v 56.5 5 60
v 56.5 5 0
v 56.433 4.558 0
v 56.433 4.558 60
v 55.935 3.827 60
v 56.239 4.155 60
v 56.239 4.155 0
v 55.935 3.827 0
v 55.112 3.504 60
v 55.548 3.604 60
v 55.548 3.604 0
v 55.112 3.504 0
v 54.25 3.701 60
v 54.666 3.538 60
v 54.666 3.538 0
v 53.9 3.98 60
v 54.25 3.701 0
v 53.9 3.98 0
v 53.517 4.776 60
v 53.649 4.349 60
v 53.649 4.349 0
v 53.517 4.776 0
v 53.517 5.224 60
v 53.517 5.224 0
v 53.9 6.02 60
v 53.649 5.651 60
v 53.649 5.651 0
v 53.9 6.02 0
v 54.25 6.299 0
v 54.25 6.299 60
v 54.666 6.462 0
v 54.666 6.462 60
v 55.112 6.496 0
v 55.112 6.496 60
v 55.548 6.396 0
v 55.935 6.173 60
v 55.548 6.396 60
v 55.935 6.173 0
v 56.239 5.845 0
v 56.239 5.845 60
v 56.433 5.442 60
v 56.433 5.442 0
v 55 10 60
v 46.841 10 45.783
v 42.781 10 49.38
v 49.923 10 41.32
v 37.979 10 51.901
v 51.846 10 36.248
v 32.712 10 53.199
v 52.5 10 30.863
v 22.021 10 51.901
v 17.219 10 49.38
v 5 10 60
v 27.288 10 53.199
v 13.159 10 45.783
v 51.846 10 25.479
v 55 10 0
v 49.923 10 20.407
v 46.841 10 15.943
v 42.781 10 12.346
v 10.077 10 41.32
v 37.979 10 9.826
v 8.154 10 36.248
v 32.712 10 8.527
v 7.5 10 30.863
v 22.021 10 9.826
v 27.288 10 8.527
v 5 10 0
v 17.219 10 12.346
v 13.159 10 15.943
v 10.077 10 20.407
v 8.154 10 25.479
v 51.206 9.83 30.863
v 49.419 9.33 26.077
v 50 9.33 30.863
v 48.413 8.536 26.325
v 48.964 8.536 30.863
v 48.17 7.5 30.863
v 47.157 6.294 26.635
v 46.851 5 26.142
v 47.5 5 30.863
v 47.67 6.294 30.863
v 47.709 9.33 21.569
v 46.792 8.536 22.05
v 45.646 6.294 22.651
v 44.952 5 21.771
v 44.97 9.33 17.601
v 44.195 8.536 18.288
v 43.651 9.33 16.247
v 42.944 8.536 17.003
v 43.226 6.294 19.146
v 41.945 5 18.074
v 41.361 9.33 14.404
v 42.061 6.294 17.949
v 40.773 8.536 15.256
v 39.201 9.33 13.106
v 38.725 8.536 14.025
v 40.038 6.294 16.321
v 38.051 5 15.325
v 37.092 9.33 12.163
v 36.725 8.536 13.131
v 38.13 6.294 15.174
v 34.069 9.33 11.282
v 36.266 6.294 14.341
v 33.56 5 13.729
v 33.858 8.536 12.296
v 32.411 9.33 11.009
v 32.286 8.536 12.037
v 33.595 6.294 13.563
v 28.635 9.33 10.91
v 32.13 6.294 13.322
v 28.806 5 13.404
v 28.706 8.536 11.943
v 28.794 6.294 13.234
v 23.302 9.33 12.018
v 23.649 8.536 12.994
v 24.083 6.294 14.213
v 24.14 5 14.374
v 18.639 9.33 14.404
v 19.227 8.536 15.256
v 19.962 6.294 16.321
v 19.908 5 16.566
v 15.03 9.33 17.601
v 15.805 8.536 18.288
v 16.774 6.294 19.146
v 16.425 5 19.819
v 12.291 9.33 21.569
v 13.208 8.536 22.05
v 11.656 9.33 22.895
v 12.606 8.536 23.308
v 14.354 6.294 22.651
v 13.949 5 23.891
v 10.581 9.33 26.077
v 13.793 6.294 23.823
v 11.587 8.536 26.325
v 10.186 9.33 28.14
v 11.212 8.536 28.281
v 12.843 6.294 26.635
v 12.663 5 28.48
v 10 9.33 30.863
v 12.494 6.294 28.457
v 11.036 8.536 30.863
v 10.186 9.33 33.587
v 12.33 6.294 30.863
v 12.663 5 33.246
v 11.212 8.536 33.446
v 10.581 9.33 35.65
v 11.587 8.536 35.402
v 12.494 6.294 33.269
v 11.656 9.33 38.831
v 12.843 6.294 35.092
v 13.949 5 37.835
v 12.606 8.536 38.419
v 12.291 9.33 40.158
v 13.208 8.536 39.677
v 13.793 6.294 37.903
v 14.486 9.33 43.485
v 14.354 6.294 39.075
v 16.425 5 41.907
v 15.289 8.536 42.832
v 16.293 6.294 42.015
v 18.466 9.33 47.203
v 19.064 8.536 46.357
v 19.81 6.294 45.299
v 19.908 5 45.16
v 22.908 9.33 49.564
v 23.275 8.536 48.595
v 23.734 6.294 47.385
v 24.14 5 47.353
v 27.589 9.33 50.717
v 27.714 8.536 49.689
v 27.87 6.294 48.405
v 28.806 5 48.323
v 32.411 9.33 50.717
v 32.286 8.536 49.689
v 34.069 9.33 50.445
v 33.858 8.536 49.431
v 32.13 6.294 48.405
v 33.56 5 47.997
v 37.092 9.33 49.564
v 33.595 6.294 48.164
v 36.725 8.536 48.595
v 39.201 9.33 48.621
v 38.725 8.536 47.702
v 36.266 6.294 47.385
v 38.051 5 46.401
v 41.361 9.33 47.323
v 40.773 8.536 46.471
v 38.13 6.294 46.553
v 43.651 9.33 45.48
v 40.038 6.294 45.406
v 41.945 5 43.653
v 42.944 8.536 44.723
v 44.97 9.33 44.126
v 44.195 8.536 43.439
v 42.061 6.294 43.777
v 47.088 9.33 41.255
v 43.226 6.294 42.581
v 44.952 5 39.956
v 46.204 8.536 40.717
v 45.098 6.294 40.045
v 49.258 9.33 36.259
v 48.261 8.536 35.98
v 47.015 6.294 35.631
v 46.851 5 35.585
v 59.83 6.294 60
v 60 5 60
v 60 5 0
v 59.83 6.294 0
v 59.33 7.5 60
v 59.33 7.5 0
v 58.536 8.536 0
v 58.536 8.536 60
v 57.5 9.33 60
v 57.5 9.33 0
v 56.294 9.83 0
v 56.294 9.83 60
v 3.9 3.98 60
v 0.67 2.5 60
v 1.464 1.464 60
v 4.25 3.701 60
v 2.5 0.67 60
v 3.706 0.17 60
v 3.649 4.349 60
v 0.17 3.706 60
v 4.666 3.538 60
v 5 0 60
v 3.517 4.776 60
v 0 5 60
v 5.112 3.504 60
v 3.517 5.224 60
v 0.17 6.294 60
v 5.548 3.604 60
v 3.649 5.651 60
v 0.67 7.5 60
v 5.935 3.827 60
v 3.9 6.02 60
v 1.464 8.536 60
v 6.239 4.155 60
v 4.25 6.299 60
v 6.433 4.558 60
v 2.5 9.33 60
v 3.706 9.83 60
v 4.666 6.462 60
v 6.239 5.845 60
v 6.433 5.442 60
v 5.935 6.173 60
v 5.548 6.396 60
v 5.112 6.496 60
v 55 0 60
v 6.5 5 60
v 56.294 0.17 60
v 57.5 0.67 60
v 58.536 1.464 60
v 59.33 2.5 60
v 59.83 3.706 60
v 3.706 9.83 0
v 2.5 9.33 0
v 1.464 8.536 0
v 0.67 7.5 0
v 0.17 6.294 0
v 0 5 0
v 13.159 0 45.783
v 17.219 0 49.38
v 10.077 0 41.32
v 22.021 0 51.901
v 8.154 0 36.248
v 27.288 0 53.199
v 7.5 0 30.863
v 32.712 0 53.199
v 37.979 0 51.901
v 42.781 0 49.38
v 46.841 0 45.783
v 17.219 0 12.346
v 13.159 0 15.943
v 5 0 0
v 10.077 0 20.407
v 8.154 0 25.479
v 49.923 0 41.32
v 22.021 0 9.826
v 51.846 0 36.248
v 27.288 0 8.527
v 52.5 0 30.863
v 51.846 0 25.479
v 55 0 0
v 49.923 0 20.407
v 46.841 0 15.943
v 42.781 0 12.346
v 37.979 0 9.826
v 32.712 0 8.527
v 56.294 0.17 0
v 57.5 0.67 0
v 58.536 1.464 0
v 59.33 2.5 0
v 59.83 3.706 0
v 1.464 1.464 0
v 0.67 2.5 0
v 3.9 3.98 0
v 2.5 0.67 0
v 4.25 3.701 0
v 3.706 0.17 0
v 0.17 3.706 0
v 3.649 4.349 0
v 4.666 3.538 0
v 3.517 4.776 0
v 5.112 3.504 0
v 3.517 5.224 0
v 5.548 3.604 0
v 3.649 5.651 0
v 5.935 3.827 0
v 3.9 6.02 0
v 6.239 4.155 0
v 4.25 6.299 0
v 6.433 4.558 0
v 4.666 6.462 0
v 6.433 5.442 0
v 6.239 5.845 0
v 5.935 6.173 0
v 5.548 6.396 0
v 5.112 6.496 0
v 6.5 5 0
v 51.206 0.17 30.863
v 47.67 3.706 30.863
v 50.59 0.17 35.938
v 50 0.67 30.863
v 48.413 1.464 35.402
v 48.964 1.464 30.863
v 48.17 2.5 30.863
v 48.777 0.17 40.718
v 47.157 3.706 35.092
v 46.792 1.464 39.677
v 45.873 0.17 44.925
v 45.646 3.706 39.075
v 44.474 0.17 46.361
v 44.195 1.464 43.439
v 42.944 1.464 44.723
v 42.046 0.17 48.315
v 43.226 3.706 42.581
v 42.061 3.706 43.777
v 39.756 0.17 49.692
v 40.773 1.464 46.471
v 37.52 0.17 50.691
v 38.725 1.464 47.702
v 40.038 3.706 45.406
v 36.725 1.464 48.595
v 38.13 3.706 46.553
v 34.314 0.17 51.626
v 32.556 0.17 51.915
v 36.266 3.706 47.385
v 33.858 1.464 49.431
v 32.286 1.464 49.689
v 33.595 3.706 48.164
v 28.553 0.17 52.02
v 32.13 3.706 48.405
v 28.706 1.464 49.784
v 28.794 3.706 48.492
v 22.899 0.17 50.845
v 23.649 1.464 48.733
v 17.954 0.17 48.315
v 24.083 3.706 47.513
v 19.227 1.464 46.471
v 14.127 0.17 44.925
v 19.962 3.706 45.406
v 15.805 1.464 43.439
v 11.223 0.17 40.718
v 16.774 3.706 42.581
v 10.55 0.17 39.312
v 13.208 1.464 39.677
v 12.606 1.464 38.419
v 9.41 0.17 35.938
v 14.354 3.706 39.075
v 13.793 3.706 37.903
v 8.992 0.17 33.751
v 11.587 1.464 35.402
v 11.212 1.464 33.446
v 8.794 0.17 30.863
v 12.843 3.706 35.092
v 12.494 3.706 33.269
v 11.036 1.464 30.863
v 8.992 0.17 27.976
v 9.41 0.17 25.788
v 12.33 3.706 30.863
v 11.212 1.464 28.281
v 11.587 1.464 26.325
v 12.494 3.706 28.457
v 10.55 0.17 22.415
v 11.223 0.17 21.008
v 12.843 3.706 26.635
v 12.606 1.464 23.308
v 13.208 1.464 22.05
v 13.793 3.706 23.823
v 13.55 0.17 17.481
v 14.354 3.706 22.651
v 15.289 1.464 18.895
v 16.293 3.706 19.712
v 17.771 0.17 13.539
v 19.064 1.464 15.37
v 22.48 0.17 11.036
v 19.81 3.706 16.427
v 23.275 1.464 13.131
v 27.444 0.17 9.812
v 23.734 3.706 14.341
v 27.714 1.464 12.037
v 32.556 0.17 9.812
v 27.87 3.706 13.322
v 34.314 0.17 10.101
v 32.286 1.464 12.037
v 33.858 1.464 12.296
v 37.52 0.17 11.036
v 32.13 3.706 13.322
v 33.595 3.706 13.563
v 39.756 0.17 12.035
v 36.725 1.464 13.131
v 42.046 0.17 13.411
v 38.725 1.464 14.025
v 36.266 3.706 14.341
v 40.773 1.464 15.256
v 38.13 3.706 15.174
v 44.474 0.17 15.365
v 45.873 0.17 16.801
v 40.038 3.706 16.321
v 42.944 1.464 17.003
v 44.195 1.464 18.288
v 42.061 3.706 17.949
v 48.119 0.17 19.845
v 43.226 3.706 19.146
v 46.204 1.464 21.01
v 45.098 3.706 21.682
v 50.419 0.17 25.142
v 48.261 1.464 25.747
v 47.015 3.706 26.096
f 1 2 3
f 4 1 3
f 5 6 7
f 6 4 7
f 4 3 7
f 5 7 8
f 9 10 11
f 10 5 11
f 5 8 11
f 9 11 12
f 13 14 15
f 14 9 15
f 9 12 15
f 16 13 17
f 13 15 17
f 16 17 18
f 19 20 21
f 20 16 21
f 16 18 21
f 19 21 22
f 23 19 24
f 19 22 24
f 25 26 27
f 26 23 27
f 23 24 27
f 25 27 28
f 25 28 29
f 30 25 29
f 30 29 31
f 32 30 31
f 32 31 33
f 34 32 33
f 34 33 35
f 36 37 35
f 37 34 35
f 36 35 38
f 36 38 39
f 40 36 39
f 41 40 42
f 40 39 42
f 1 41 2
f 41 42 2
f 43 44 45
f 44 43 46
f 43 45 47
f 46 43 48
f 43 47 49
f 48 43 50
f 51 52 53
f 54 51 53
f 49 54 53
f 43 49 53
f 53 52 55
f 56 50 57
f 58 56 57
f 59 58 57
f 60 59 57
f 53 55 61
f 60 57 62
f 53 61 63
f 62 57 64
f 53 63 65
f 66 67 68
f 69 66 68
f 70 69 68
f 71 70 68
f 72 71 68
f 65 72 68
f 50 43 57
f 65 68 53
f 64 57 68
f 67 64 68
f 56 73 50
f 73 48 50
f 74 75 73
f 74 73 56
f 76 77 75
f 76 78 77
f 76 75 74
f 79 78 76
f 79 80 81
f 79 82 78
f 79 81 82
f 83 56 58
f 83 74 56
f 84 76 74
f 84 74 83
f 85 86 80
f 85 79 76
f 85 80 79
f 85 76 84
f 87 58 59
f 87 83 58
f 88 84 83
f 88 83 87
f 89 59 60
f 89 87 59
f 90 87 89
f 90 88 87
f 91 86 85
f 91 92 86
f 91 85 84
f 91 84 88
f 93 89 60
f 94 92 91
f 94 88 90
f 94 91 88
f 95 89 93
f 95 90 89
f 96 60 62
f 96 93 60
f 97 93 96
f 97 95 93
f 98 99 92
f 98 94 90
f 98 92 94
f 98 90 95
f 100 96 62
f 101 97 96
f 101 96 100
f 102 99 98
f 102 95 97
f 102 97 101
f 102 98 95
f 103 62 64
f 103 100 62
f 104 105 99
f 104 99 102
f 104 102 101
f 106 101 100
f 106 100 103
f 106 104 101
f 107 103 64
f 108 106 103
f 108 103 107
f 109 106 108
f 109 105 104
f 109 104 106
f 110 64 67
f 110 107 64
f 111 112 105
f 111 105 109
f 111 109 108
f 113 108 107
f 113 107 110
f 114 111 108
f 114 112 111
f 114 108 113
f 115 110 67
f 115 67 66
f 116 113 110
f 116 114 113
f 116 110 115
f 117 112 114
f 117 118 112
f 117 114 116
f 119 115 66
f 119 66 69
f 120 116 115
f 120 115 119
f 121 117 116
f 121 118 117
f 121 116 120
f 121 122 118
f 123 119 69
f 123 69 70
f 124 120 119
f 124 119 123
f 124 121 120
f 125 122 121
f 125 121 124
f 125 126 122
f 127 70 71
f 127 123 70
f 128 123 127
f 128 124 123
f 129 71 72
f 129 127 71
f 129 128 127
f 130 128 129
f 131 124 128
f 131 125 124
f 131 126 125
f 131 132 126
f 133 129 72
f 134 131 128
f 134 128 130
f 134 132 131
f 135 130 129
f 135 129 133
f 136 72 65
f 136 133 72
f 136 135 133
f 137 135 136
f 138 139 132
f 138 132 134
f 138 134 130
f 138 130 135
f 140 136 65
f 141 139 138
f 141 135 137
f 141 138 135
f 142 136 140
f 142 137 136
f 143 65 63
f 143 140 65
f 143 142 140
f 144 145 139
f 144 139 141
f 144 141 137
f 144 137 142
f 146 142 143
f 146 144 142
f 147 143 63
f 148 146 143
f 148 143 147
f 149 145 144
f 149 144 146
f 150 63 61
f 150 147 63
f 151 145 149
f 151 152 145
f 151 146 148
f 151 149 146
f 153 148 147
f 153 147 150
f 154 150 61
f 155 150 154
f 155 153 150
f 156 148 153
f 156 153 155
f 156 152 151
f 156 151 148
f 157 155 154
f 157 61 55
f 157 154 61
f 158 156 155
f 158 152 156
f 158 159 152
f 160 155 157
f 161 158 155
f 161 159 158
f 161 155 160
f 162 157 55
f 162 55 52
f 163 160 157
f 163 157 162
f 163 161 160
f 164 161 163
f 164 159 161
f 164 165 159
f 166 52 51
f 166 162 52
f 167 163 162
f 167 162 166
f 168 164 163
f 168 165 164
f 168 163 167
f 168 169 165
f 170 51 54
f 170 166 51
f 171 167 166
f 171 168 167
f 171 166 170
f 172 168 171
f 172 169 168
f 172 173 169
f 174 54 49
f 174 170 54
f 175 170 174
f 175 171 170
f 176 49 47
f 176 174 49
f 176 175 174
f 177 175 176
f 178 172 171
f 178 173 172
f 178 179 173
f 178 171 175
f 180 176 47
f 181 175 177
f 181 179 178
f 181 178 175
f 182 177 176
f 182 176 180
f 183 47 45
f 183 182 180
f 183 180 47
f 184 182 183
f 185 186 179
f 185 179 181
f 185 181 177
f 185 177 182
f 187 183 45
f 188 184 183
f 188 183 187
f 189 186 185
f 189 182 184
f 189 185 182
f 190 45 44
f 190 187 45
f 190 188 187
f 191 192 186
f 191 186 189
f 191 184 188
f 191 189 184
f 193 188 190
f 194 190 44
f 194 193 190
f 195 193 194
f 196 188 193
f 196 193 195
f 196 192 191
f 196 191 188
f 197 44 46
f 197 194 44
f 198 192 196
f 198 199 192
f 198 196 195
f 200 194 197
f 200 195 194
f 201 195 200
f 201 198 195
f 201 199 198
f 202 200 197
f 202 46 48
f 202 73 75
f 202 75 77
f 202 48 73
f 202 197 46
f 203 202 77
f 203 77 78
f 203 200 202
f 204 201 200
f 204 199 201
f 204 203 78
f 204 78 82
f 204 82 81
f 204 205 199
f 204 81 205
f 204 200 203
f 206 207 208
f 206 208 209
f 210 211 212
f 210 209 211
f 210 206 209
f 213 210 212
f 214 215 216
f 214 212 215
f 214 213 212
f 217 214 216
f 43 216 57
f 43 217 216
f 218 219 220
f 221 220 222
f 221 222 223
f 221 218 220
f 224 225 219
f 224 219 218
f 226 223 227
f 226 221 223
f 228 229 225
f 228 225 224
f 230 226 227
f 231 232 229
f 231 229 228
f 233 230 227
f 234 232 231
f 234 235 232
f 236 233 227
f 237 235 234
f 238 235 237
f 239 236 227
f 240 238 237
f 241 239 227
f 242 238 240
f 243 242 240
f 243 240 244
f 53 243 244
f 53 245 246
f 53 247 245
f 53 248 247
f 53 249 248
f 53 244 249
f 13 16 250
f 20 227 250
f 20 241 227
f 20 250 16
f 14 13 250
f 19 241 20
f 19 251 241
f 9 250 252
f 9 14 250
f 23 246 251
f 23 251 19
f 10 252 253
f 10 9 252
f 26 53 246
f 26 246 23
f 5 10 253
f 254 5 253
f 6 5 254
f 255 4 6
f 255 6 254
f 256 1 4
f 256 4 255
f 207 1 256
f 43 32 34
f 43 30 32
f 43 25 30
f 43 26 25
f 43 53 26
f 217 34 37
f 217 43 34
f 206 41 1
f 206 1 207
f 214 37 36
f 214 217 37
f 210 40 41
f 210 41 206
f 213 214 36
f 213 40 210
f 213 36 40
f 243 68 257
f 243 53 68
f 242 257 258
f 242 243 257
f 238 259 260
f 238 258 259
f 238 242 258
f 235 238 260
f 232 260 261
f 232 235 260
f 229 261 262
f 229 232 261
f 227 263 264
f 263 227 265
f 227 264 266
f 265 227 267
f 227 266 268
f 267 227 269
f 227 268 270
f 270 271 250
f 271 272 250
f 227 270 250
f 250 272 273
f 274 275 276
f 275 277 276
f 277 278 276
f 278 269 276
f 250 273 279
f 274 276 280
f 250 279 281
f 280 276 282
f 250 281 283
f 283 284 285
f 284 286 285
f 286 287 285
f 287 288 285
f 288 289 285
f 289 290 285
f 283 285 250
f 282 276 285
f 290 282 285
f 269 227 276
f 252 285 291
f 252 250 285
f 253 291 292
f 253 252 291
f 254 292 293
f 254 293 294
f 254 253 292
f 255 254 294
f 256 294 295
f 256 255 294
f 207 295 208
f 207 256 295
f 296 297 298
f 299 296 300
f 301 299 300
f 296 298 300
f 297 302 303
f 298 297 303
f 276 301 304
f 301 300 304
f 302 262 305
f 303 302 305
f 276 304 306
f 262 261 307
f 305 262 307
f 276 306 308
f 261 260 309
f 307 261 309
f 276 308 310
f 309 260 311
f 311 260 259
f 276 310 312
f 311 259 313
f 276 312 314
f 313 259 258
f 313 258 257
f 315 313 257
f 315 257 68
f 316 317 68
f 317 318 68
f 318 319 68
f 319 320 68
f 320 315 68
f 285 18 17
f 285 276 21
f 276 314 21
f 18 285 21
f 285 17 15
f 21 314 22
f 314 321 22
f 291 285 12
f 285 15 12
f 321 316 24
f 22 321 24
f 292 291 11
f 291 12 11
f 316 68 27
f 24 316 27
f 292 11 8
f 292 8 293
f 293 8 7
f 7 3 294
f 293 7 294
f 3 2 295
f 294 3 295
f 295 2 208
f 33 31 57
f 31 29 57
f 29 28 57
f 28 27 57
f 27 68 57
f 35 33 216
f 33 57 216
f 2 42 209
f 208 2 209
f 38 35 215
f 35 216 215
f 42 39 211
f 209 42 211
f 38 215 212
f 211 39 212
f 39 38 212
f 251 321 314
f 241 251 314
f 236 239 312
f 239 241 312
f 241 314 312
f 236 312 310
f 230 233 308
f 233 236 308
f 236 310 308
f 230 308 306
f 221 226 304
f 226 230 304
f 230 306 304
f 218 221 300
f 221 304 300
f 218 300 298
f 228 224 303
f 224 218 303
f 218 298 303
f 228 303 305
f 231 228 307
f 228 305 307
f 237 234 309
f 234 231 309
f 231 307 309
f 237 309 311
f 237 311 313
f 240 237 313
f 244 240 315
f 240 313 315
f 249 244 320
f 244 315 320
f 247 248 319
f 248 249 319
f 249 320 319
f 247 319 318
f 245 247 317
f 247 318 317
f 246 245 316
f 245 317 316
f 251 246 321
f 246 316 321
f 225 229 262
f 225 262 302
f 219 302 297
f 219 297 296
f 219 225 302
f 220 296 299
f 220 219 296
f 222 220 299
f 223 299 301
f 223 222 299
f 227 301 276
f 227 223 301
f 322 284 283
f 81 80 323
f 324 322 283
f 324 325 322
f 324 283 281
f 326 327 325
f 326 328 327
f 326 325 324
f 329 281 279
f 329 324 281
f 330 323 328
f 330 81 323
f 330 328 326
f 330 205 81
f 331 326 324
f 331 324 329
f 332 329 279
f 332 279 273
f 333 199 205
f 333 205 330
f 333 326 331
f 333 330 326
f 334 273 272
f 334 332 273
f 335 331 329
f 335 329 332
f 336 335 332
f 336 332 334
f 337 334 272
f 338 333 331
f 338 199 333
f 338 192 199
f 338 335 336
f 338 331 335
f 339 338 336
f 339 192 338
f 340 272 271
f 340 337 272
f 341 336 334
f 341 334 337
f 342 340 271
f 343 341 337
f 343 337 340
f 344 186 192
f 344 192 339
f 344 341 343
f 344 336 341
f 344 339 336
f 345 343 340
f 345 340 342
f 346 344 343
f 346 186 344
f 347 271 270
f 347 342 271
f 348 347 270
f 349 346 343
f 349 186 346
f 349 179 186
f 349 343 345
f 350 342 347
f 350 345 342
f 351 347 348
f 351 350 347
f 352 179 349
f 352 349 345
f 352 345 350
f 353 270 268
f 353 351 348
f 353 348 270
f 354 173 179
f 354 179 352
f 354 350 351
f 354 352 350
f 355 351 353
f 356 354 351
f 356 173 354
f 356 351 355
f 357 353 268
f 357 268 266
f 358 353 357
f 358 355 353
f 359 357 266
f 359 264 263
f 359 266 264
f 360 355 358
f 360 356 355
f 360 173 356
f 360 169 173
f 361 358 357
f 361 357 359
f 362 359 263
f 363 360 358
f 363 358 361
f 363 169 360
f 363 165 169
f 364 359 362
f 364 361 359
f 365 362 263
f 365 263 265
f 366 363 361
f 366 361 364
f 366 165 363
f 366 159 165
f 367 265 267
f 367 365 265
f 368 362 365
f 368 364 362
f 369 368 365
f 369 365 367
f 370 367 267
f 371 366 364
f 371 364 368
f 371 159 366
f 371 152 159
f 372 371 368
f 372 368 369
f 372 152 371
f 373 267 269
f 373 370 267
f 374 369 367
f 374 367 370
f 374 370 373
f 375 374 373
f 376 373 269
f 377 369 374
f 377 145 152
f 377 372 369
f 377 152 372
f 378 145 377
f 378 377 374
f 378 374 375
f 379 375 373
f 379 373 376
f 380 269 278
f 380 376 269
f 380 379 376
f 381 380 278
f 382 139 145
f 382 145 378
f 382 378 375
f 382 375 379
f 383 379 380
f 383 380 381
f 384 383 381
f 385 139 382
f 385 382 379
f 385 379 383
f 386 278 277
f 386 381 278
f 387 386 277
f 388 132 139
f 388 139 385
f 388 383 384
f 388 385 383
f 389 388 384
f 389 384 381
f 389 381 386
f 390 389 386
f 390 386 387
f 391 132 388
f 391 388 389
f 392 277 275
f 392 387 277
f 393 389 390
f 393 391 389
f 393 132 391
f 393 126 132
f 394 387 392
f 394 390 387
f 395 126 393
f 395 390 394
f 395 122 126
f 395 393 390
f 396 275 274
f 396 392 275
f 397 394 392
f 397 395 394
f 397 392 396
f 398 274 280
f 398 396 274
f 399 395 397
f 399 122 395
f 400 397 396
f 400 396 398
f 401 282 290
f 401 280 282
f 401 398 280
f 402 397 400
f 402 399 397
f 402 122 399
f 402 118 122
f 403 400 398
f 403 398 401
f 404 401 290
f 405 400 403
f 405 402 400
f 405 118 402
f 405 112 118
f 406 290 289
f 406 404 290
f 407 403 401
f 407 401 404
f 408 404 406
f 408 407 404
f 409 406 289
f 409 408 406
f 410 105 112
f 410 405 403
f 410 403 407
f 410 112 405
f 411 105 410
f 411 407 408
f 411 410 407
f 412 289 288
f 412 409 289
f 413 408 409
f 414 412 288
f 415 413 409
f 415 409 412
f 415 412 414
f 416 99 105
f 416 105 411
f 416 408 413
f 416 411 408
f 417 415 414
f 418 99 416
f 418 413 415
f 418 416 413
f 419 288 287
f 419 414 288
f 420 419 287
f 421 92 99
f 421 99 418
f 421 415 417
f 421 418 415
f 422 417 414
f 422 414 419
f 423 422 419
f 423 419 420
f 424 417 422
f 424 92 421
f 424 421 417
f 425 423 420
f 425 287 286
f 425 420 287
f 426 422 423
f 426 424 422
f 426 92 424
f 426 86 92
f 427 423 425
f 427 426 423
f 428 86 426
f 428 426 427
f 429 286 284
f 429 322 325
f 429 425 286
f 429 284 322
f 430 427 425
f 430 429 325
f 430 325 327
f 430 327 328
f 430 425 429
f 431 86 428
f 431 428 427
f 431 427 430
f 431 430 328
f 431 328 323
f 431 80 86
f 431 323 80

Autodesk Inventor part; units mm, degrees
ref_plane "YZ Plane" through (0, 0, 0) normal (1, 0, 0) x (0, 1, 0)
ref_plane "XZ Plane" through (0, 0, 0) normal (0, 1, 0) x (-1, 0, 0)
ref_plane "XY Plane" through (0, 0, 0) normal (0, 0, 1) x (1, 0, 0)
sketch "Sketch1" plane through (0, 0, 0) normal (0, 0, 1) x (1, 0, 0)
  line L0 (0, 0) -> (60, 0)
  line L1 (60, 0) -> (60, 10)
  line L2 (60, 10) -> (0, 10)
  line L3 (0, 10) -> (0, 0)
  line L4 (0, 0) -> (0, 5) construction
  line L5 (0, 5) -> (5, 5) construction
  circle A0 centre (5, 5) radius 1.5
  circle A1 centre (55, 5) radius 1.5
  dimension "d0" = 60
  dimension "d1" = 10
  dimension "d2" = 5
  dimension "d3" = 5
  dimension "d4" = 3
  dimension "d5" = 3
  dimension "d6" = 5
  dimension "d7" = 5
extrude "Extrusion1" add sketch "Sketch1" along normal blind 60
sketch "Sketch2" plane through (0, 10, 0) normal (0, 1, 0) x (1, 0, 0)
  circle A0 centre (30, -30.8633) radius 17.5
  line L0 (0, 0) -> (0, -60) projected
  line L1 (60, 0) -> (0, 0) projected
  dimension "d10" = 35
  dimension "d12" = 30
  dimension "d13" = 30.8633
extrude "Extrusion2" cut sketch "Sketch2" against normal blind 10
fillet "Fillet1" radius 5 6 edges at (0, 10, 30) (60, 10, 30) (60, 0, 30) (0, 0, 30) (12.5, 0, 30.8633) (12.5, 10, 30.8633)
properties part number "60x10SlimGrommet"
